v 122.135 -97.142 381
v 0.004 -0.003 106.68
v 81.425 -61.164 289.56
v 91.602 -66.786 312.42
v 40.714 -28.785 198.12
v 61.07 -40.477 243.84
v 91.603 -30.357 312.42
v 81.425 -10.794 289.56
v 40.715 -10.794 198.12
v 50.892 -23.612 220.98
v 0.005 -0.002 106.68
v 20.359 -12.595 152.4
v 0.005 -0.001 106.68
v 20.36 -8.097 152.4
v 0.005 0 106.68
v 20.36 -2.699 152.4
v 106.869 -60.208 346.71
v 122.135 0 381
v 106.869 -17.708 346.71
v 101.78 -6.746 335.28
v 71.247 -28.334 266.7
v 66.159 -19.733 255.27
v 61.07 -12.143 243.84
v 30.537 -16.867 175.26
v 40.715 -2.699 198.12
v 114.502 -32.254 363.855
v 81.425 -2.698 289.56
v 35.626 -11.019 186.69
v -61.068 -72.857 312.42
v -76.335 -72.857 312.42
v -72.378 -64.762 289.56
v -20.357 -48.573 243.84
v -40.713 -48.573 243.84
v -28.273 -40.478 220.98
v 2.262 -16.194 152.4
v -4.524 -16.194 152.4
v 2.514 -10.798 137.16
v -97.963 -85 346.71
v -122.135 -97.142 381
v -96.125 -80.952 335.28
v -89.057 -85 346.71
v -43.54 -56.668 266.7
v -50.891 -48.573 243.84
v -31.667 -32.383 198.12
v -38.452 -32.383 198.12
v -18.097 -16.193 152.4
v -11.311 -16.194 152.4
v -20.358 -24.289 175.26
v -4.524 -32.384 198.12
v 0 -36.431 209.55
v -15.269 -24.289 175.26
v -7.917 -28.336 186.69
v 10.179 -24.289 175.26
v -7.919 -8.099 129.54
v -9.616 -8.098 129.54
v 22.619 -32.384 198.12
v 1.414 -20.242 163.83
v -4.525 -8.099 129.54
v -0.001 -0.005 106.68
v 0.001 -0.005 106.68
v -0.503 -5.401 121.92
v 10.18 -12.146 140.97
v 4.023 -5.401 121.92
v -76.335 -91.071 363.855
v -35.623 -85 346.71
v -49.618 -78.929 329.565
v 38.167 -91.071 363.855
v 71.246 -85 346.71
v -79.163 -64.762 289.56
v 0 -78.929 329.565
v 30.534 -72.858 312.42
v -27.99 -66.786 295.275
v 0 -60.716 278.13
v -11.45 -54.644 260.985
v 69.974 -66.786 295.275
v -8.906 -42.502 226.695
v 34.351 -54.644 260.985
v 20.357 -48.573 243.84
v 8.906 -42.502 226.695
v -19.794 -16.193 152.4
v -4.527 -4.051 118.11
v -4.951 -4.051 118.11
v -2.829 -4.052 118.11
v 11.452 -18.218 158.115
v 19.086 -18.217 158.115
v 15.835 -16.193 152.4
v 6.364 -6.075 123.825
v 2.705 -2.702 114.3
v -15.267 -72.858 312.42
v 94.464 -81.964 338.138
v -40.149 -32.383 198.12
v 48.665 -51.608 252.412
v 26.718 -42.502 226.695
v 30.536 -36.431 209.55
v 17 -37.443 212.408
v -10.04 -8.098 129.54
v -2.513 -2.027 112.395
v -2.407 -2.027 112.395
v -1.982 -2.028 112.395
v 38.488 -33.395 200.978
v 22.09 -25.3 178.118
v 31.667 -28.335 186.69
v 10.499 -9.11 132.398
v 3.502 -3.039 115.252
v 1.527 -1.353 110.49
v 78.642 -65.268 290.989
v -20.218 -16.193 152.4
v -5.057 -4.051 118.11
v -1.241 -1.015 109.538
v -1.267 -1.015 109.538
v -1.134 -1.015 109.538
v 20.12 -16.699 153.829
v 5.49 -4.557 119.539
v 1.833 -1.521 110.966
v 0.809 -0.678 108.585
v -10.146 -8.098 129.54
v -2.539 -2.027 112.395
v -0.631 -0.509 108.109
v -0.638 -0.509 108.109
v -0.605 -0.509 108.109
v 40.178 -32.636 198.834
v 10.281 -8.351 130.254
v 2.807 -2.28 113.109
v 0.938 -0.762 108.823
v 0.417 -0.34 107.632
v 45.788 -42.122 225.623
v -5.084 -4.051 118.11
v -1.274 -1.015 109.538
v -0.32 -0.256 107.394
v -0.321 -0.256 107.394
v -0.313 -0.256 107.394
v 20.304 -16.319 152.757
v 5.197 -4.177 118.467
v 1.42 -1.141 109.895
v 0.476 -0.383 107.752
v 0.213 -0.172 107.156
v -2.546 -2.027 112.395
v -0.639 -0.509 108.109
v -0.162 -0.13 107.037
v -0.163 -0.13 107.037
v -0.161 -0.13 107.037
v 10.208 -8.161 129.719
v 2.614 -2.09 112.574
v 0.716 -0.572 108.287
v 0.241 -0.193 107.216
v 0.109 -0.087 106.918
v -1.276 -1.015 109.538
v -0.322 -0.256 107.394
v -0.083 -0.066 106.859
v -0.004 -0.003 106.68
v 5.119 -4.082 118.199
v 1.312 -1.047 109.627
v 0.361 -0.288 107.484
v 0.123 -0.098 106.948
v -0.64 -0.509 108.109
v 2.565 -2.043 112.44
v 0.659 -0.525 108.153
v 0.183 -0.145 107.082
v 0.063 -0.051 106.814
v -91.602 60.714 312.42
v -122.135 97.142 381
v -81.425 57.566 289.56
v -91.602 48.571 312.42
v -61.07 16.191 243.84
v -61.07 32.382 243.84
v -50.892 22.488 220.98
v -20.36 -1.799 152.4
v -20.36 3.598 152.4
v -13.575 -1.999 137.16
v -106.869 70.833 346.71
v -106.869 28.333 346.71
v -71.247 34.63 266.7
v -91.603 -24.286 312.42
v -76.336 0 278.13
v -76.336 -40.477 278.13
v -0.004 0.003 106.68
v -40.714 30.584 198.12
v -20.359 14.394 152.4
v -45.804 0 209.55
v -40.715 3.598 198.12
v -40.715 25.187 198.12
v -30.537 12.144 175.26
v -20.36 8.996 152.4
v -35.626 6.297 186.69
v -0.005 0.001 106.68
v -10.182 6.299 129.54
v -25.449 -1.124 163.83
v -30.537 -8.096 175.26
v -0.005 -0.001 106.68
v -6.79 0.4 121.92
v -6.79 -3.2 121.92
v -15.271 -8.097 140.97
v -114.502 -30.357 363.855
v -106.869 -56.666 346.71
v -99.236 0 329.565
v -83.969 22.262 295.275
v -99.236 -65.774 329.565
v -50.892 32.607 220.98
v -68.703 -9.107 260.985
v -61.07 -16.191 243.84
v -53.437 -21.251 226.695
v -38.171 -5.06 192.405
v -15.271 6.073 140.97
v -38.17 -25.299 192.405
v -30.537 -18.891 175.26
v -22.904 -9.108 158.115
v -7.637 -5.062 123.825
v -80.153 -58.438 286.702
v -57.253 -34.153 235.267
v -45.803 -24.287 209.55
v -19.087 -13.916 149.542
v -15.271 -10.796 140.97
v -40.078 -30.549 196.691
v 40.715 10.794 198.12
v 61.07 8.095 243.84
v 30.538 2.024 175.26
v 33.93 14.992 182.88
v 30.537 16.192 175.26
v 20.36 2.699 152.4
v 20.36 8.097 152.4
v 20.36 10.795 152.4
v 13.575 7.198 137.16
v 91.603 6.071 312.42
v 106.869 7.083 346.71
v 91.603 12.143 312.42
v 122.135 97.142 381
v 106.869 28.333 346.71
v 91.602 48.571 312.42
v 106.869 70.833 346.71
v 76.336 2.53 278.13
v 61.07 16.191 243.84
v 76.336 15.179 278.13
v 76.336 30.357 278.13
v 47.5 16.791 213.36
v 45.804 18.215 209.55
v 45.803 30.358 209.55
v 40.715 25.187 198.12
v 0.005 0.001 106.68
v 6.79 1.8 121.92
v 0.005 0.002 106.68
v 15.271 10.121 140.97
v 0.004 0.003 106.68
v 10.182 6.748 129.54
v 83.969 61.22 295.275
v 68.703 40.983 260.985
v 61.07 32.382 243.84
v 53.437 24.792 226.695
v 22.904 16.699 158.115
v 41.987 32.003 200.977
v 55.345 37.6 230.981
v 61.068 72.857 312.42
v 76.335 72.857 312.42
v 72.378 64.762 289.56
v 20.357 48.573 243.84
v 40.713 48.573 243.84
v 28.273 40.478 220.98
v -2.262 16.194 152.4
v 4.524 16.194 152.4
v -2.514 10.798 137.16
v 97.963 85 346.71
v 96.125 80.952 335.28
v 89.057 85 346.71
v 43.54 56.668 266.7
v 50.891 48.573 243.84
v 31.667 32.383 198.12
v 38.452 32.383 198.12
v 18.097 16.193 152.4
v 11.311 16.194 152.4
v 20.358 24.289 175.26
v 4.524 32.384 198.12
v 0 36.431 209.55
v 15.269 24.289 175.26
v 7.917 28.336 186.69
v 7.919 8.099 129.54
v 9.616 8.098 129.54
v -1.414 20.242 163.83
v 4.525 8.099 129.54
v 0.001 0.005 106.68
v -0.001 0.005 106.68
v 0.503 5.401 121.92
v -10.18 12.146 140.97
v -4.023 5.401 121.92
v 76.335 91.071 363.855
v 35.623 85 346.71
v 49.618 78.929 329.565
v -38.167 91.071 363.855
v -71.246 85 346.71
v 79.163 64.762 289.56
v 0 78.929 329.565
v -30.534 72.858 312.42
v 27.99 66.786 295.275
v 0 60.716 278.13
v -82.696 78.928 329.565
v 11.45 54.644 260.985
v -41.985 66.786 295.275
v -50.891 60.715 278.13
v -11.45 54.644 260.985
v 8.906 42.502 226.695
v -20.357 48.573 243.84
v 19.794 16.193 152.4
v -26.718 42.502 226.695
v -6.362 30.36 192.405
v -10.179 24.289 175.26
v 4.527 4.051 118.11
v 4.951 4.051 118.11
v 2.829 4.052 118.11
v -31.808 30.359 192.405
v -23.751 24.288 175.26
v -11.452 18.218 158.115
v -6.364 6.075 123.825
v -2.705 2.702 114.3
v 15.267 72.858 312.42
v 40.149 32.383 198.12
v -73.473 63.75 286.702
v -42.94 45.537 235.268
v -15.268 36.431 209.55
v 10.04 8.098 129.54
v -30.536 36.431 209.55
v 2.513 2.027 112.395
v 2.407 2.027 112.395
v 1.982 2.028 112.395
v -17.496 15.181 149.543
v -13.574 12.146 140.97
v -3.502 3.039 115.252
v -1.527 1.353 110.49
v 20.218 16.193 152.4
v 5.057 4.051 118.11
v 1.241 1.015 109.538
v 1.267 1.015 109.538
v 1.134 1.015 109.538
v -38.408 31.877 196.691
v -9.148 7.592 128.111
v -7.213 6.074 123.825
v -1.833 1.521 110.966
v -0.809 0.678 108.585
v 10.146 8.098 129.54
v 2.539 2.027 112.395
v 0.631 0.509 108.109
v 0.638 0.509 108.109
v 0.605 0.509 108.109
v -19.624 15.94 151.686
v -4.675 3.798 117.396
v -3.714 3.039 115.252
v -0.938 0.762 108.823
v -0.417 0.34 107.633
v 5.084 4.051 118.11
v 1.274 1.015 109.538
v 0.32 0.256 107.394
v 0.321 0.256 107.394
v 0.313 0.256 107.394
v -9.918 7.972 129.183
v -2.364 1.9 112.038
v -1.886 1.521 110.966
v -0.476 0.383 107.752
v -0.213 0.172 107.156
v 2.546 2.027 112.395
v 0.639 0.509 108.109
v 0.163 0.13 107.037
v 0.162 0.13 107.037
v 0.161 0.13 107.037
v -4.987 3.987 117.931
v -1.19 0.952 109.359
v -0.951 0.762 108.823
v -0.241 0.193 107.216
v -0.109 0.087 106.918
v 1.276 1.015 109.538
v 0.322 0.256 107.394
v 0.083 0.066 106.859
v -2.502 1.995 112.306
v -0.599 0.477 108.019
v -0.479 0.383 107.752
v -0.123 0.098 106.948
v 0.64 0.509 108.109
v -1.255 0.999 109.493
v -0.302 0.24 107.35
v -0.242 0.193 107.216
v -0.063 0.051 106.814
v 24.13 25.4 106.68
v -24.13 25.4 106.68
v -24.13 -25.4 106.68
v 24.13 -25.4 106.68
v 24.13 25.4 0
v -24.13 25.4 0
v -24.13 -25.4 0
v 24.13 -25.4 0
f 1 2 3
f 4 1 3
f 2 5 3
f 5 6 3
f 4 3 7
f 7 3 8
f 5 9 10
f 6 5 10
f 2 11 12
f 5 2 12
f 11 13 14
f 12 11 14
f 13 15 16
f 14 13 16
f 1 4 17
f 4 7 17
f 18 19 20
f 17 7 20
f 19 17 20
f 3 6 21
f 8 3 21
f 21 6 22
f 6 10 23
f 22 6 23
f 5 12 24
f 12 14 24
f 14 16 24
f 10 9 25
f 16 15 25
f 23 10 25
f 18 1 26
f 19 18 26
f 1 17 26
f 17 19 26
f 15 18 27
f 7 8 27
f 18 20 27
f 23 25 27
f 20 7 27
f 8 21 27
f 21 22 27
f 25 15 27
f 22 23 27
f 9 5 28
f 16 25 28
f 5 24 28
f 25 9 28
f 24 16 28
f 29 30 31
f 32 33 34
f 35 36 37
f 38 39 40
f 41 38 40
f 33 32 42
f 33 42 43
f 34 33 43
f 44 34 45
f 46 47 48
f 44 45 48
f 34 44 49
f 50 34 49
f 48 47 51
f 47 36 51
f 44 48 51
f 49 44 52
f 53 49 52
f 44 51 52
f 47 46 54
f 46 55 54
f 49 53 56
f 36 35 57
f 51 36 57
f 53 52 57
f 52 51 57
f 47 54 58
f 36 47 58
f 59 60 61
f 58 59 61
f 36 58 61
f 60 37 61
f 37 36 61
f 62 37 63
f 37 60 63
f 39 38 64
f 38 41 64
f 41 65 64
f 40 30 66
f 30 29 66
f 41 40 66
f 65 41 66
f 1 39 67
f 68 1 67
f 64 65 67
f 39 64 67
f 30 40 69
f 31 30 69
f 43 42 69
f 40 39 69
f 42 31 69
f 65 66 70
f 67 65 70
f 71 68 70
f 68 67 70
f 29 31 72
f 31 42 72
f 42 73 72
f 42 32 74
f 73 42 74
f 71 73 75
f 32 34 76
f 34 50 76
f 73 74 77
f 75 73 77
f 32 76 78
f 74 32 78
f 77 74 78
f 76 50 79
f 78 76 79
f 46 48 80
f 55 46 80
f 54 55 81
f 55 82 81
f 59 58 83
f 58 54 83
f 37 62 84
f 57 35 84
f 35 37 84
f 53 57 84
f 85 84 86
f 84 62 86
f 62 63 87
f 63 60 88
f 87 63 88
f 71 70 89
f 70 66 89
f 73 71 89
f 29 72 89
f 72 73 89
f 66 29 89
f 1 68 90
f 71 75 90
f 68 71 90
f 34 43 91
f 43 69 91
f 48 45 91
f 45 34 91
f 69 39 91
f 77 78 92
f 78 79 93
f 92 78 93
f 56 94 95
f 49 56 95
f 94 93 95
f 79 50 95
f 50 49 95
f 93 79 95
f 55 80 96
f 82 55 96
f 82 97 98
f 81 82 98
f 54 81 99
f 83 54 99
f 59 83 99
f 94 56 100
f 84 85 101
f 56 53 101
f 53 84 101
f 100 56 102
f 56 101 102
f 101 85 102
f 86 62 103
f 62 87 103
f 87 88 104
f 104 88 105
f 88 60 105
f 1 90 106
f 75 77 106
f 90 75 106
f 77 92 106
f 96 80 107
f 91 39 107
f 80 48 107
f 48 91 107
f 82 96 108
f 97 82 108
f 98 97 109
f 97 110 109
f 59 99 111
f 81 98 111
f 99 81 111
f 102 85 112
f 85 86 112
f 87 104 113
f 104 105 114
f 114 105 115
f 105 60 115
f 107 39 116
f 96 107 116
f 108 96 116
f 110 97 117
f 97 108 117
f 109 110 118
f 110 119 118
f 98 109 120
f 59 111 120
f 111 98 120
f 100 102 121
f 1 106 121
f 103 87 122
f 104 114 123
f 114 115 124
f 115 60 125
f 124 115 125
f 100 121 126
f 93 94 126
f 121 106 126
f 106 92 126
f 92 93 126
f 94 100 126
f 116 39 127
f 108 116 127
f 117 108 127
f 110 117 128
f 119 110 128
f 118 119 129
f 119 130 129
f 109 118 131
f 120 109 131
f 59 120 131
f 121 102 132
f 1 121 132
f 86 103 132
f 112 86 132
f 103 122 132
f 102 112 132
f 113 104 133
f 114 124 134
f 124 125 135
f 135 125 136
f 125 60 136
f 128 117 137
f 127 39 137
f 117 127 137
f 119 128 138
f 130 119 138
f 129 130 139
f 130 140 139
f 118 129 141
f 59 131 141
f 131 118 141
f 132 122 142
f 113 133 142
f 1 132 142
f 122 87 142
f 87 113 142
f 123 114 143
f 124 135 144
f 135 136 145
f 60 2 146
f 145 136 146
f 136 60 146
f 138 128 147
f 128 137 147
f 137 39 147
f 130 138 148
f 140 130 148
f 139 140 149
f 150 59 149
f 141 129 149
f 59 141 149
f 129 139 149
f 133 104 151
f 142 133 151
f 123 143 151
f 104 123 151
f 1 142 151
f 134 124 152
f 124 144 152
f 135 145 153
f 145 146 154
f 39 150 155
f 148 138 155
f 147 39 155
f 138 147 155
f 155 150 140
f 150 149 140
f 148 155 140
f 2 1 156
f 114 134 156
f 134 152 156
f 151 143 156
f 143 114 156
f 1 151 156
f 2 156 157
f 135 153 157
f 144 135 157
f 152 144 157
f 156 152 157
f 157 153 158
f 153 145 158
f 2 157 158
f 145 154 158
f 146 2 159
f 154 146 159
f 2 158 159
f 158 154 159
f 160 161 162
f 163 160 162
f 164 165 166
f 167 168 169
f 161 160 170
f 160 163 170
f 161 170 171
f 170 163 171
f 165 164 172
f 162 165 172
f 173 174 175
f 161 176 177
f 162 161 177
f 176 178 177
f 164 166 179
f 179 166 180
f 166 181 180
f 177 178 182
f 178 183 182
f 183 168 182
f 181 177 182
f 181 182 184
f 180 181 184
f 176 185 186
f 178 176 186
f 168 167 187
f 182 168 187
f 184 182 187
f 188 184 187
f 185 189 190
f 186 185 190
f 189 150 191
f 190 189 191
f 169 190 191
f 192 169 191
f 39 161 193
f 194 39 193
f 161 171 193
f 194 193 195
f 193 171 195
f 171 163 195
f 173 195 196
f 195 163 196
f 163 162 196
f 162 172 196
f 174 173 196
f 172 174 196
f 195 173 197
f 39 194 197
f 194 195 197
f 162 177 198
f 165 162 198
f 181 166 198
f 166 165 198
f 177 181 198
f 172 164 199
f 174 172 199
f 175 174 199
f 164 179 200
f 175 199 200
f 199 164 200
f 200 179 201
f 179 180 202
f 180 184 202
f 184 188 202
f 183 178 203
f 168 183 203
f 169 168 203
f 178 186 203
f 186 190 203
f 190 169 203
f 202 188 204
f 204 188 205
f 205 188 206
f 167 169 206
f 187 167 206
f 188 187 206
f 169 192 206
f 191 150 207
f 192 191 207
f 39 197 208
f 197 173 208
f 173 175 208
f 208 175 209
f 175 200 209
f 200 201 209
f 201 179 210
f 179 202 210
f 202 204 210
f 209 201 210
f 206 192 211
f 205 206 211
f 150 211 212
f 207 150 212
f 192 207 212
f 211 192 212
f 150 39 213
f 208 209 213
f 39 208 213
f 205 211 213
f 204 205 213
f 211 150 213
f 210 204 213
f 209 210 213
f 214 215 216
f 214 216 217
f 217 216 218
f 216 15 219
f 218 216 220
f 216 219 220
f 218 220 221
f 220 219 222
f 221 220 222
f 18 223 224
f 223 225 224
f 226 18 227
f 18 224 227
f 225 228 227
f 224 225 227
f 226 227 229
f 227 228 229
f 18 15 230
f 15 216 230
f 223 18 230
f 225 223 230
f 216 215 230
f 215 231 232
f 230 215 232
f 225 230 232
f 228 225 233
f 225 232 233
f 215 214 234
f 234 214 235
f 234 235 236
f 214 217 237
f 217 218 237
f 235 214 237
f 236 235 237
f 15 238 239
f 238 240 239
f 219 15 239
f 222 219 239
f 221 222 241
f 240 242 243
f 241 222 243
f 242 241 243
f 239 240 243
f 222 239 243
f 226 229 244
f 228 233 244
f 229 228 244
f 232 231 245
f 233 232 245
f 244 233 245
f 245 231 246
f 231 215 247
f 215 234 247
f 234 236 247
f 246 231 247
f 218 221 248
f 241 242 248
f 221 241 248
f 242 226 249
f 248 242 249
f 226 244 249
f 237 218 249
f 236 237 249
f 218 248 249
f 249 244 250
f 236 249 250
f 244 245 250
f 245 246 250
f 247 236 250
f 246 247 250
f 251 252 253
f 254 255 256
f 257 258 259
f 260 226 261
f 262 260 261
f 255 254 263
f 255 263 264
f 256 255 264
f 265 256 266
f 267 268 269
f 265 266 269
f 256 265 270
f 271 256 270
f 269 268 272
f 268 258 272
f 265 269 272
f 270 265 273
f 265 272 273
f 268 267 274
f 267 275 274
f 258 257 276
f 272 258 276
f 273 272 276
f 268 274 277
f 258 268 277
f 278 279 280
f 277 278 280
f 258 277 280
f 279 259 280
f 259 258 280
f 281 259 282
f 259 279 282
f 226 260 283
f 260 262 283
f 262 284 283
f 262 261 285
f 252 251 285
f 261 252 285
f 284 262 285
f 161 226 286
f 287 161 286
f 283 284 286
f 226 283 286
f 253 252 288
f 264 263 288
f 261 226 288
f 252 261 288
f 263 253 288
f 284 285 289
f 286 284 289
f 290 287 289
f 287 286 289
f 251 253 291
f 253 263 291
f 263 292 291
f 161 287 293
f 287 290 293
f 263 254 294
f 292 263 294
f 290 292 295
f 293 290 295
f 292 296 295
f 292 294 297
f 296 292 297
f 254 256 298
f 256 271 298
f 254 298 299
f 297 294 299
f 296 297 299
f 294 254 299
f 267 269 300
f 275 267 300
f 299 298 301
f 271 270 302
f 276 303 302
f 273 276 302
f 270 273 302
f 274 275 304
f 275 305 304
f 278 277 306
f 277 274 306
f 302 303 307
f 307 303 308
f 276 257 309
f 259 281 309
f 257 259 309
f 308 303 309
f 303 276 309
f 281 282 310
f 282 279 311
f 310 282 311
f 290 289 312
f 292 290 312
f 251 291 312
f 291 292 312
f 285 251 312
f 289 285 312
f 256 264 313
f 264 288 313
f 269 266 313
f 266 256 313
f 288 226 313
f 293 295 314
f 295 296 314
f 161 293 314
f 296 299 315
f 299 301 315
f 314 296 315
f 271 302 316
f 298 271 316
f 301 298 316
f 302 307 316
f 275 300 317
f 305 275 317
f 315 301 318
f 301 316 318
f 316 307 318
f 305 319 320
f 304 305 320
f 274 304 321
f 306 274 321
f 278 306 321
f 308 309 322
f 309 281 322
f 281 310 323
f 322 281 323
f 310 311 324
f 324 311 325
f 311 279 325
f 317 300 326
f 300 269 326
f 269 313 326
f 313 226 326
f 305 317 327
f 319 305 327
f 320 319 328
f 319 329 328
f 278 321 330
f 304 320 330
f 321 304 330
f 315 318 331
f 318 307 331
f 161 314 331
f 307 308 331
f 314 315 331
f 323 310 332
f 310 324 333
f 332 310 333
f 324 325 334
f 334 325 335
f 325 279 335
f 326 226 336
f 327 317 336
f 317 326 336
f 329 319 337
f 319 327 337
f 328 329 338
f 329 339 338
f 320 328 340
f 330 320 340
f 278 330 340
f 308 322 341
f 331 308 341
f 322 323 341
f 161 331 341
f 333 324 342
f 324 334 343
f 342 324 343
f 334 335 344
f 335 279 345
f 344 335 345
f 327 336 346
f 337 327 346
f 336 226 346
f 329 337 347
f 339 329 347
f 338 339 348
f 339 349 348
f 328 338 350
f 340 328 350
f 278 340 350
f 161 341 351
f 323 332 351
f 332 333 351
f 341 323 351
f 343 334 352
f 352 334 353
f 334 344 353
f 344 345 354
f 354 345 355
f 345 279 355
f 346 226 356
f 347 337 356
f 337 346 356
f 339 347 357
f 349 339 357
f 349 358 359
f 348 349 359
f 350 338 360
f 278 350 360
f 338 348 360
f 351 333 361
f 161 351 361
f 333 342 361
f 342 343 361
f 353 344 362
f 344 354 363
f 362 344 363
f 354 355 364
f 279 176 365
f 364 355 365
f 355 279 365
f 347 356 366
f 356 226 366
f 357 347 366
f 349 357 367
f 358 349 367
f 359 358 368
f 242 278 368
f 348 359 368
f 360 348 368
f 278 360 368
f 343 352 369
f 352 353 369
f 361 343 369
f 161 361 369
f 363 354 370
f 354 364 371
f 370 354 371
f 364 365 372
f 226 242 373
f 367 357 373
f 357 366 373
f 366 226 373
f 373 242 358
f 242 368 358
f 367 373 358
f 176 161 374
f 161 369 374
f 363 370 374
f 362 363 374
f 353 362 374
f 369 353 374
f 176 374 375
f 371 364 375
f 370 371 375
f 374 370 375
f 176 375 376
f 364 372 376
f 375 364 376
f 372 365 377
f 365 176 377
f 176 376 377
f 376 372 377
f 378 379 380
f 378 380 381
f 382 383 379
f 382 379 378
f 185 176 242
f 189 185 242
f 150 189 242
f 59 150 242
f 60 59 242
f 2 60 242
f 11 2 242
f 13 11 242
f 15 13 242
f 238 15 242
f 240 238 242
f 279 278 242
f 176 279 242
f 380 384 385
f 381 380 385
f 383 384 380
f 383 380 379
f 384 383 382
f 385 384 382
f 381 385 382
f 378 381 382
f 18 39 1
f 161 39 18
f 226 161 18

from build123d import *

# Parameters (mm, degrees)
F0_W     = 48.26
F0_H     = 50.8
F1_DEPTH = 106.68
F6_W     = 244.270266
F6_H     = 194.283614
F8_R     = 0.005


with BuildPart() as f1:
    # F0 (on Top) → F1 (new body)
    with BuildSketch(Plane.XY):
        Rectangle(F0_W, F0_H)
    extrude(amount=F1_DEPTH)


with BuildPart() as f9:
    # F6 (on offset) → F9 section 0
    with BuildSketch(Plane.XY.offset(381)):
        Rectangle(F6_W, F6_H)
    # F8 (on plane+point) → F9 section 1
    with BuildSketch(Plane.XY.offset(106.68)):
        Circle(F8_R)
    loft()


solid = Compound([f1.part, f9.part])
